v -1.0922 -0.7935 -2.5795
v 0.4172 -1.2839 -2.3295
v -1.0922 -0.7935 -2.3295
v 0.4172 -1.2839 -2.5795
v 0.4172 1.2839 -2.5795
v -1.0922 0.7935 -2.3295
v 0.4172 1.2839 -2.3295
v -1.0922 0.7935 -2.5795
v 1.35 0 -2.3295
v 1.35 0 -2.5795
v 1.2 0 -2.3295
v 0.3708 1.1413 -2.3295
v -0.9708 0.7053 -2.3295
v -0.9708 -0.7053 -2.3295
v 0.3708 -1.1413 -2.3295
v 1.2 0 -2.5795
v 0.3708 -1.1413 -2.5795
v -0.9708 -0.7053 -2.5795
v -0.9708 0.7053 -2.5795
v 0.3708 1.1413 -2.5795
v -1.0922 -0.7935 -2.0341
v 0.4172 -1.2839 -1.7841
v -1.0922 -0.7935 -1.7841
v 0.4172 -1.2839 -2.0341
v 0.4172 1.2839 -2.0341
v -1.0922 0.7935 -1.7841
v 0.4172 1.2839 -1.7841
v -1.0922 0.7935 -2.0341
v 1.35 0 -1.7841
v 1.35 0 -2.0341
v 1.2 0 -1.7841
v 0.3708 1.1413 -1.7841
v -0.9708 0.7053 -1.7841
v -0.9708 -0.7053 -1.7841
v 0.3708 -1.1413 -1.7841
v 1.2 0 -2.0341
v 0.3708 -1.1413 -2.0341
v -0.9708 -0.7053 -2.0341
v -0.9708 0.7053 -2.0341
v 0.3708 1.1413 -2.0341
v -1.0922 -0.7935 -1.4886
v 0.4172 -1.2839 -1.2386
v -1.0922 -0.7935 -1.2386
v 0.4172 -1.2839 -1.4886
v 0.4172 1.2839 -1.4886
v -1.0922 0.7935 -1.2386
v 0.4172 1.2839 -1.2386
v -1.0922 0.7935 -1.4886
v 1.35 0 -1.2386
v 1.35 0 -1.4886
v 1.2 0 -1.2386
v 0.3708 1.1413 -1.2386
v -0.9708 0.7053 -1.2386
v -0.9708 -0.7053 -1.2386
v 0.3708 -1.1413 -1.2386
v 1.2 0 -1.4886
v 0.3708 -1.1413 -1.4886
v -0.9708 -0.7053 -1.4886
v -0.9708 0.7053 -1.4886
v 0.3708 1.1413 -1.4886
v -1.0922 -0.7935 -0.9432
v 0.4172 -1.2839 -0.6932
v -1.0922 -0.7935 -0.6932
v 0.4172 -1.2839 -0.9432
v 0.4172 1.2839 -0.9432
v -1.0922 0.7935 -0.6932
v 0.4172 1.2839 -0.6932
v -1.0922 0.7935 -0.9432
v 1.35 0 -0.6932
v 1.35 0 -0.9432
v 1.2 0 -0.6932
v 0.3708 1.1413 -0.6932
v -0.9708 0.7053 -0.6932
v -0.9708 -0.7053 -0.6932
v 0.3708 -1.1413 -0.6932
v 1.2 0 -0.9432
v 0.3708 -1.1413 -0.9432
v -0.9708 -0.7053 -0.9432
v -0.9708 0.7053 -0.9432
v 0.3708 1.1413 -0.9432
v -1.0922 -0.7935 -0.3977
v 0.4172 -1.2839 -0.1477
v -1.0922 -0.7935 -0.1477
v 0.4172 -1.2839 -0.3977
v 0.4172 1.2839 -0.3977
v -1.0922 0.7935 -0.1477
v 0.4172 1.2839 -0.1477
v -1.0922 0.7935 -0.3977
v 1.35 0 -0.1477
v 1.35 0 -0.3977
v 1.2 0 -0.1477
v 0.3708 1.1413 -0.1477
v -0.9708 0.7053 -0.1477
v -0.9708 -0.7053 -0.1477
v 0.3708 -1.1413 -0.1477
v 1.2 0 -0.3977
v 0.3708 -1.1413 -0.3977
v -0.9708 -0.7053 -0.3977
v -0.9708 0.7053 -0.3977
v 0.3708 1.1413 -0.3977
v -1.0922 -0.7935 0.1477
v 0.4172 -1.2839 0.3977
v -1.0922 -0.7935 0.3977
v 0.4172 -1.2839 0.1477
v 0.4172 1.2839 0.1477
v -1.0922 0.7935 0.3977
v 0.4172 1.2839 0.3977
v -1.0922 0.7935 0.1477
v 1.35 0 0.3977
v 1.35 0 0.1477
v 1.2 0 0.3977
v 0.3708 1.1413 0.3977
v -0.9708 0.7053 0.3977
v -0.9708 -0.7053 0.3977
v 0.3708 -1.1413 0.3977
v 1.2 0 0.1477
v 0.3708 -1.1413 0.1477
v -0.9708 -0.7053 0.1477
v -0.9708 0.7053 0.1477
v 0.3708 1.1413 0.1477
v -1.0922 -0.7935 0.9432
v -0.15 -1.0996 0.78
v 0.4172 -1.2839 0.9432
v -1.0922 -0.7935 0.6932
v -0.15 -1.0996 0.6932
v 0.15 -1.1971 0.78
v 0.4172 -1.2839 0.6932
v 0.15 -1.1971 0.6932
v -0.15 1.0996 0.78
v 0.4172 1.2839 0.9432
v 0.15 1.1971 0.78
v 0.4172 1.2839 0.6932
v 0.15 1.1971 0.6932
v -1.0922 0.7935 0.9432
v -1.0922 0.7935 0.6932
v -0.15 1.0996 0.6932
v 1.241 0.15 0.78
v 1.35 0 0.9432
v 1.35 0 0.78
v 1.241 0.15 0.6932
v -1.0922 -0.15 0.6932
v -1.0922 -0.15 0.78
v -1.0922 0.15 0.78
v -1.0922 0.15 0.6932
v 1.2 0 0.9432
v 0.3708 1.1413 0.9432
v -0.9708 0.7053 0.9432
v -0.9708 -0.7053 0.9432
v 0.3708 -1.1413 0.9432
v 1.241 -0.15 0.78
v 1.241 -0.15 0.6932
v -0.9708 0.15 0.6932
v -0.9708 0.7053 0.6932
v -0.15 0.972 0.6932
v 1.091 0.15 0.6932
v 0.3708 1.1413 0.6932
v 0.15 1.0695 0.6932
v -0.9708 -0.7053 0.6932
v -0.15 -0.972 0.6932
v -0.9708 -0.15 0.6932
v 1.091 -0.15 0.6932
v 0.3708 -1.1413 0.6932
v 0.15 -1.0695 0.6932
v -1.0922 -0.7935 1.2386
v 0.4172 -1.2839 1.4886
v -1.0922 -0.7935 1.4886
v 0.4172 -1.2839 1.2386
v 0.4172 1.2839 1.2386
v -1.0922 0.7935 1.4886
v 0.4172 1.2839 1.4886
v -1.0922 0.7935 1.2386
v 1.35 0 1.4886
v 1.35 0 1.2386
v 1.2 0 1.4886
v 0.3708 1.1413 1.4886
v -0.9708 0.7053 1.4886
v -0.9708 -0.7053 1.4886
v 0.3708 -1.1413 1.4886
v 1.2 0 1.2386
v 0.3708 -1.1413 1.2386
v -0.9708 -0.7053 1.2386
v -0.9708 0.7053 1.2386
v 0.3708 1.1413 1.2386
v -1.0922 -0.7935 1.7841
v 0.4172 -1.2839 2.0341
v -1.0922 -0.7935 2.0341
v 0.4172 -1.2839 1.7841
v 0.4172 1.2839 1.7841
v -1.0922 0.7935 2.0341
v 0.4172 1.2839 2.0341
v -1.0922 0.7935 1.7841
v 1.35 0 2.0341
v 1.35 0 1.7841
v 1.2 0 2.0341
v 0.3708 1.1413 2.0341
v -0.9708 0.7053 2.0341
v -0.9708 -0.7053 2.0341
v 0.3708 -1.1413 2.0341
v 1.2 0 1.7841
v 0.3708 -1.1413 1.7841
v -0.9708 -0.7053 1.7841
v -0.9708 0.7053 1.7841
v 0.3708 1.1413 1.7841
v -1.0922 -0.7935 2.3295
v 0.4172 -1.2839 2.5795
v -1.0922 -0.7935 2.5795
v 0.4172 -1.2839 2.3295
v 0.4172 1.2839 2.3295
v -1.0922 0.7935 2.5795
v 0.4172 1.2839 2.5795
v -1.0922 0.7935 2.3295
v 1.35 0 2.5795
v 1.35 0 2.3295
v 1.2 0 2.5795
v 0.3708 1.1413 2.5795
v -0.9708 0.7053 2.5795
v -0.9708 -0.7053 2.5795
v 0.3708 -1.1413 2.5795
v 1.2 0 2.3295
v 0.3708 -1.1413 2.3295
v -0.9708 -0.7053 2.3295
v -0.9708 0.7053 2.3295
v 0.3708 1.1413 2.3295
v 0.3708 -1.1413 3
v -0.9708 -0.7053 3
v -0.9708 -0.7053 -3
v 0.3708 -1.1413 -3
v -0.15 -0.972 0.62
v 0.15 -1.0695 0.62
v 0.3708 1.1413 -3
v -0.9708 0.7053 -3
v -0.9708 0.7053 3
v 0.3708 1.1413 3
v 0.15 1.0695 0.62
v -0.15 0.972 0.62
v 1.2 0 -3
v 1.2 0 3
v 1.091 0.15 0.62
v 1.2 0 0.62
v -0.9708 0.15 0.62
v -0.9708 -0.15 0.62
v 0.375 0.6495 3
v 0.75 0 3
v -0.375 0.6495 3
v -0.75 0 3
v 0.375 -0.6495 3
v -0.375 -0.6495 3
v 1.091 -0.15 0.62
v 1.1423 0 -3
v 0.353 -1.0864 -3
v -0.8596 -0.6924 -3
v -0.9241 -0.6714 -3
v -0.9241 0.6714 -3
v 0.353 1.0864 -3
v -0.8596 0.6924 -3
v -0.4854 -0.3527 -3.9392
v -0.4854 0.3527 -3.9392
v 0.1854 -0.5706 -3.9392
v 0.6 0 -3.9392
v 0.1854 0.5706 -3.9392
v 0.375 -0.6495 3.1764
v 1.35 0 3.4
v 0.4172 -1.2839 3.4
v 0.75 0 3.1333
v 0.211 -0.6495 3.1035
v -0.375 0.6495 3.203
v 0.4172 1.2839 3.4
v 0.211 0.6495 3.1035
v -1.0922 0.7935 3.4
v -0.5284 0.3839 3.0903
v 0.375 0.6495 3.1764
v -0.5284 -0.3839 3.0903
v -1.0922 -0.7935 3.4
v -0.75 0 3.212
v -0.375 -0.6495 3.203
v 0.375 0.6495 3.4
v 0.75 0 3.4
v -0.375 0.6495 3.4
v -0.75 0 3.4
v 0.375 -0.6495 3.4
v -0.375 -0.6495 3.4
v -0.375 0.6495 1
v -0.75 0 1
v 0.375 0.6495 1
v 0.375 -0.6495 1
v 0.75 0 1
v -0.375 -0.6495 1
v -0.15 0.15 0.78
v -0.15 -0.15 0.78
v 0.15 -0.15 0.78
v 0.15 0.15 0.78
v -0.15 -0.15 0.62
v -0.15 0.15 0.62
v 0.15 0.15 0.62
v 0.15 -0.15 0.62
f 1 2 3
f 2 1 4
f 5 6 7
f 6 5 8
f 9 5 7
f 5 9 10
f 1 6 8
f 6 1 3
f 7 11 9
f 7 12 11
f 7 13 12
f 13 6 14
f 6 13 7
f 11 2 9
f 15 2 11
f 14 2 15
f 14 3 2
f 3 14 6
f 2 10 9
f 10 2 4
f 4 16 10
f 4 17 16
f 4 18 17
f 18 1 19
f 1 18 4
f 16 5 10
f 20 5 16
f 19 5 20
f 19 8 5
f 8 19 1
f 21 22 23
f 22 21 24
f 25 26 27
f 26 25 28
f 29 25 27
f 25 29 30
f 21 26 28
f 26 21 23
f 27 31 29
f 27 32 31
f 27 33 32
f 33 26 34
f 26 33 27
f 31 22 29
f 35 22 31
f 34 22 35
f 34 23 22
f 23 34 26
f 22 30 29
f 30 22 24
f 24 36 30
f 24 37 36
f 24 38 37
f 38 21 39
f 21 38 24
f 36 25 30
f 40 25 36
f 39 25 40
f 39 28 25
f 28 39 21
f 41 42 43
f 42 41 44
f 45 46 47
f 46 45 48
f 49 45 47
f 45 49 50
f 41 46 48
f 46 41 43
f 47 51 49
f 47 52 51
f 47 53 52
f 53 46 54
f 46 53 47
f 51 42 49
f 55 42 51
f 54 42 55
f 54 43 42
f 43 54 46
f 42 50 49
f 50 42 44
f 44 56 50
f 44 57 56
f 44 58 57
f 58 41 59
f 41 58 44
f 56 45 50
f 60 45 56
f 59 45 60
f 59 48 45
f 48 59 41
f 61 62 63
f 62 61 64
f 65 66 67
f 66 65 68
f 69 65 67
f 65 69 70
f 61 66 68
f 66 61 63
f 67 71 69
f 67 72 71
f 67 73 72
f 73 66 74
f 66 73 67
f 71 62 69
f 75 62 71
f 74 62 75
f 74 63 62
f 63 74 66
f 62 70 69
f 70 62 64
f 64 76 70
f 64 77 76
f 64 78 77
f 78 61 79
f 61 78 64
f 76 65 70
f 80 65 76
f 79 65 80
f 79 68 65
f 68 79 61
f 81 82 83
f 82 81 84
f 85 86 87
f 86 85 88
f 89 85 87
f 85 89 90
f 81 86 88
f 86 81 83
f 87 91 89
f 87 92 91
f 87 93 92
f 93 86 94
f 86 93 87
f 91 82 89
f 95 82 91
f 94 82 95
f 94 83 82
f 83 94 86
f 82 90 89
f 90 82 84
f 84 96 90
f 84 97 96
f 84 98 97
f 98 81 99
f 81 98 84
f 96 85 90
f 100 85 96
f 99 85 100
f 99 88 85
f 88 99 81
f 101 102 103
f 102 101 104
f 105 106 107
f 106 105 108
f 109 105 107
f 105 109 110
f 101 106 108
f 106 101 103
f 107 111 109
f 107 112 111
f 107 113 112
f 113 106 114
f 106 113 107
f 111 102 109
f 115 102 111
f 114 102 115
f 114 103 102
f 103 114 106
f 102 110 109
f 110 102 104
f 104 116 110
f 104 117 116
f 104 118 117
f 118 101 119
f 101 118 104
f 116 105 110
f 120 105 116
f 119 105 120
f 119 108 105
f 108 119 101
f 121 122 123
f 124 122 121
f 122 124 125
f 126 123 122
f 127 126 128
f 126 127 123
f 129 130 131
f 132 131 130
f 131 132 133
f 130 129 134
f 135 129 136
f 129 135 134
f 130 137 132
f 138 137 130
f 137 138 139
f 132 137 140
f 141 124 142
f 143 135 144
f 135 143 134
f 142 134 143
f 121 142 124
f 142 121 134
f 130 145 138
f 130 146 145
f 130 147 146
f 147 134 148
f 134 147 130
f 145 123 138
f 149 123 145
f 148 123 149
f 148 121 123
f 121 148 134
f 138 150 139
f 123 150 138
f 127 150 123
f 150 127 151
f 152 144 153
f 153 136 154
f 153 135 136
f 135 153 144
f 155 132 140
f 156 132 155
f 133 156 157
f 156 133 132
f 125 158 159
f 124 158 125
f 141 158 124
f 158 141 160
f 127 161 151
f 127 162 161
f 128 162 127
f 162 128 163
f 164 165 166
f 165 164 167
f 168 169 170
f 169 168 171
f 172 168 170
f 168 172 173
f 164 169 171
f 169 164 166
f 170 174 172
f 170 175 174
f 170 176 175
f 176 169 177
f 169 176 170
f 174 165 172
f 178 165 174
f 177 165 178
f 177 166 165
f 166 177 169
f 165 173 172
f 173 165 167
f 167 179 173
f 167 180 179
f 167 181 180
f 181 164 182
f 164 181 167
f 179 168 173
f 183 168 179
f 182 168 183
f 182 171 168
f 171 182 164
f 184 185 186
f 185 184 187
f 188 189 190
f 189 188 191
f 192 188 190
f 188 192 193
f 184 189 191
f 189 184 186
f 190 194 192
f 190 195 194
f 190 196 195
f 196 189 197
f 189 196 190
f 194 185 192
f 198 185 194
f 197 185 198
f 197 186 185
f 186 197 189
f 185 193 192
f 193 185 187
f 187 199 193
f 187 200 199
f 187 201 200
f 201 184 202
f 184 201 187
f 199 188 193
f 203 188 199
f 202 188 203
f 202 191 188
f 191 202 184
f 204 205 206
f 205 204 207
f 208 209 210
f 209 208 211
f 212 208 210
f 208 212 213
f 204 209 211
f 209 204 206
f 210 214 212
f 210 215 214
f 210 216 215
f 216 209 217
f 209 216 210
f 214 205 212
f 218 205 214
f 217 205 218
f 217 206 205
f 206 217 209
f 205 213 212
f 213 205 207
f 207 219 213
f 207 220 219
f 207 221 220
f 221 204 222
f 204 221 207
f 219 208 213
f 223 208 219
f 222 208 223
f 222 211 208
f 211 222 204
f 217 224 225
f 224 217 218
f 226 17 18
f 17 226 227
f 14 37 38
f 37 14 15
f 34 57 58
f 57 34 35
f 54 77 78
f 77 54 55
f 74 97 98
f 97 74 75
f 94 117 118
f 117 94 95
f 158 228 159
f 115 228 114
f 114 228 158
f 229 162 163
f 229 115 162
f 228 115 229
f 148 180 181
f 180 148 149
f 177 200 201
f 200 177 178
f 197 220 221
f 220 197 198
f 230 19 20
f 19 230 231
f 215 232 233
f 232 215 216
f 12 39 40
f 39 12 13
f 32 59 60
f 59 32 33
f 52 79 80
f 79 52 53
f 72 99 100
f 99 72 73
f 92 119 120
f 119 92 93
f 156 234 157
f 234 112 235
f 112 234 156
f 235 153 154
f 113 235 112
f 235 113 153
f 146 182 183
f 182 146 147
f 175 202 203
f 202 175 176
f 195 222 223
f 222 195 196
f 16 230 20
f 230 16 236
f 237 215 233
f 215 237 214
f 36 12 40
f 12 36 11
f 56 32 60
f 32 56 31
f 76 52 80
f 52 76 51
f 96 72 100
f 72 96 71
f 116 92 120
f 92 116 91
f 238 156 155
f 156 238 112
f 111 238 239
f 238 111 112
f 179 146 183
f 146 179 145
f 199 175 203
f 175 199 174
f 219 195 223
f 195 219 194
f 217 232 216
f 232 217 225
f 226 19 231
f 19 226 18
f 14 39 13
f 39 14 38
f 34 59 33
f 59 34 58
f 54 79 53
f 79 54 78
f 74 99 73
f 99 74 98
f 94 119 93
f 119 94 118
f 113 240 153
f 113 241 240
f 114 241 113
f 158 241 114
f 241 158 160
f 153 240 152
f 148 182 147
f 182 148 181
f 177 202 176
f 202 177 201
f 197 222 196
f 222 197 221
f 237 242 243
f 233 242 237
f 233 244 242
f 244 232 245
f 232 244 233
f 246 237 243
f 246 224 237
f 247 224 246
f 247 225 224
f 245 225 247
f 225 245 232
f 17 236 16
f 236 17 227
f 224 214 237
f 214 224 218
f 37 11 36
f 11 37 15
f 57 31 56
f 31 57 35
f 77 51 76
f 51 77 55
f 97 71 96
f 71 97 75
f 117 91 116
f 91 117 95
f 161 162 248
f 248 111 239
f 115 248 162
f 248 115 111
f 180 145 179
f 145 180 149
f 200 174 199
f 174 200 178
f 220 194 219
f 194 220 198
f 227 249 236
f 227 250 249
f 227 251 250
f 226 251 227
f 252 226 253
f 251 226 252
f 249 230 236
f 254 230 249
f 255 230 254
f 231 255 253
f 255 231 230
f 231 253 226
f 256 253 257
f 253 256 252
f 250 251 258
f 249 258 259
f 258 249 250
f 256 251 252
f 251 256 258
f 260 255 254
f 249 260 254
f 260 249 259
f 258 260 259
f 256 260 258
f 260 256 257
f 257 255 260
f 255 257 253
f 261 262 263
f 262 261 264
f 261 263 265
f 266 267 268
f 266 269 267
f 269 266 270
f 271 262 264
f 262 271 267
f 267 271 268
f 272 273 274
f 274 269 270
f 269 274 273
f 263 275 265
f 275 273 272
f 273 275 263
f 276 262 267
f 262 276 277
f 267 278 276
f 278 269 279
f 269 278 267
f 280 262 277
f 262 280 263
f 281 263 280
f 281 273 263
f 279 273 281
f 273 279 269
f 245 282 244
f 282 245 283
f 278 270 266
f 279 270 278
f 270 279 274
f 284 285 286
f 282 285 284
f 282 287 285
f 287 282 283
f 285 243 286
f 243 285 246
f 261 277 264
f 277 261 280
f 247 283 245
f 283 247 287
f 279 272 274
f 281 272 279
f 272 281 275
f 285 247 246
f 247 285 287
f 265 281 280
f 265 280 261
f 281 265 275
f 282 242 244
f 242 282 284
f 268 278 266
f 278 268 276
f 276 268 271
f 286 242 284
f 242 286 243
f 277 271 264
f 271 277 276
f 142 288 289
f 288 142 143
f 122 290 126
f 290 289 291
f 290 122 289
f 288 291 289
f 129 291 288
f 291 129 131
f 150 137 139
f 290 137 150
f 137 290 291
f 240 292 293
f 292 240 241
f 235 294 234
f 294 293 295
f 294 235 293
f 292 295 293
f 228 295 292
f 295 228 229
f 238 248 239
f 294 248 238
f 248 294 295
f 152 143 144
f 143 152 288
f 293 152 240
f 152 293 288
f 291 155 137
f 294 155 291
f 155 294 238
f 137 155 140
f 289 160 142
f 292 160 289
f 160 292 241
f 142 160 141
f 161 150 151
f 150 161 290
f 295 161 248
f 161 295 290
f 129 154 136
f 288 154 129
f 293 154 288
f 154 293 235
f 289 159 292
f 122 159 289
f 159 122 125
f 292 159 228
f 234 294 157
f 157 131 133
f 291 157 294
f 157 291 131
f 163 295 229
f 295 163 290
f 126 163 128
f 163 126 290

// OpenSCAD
// Parameters
thread_diameter = 3.0; //[1.5:6.0:0.1]
thread_pitch = 0.5; //[0.25:1.0:0.05]
screw_length = 6.0; //[3.0:12.0:0.5]
major_diameter = 3.0; //[1.5:6.0:0.1]
minor_diameter = 2.4; //[1.2:4.8:0.05]
thread_length = 6.0; //[3.0:12.0:0.5]
tip_chamfer = 0.3; //[0.1:0.8:0.05]
socket_af = 1.5; //[0.8:3.0:0.1]
socket_depth = 2.0; //[1.0:4.0:0.1]
overlap = 0.8; //[0.3:2.0:0.1]
thread_runout_length = 0.6; //[0.3:1.5:0.1]
drive_end_chamfer = 0.25; //[0.1:0.8:0.05]
thread_ridge_height = 0.15; //[0.05:0.35:0.01]
thread_ridge_width = 0.25; //[0.1:0.6:0.05]
thread_ridge_count = 10; //[4:24:1]
marking_depth = 0.08; //[0.03:0.2:0.01]
marking_width = 0.3; //[0.15:0.8:0.05]

// Base shapes
module threaded_cylindrical_body() {
  translate([0, 0, 0])
    cylinder(h=thread_length, r=minor_diameter/2, center=true);
}

module thread_ridge(position_index) {
  translate([0, 0, -thread_length/2 + position_index * (thread_length/(thread_ridge_count+1))])
    cylinder(h=thread_ridge_width, r=minor_diameter/2 + thread_ridge_height, center=true);
}

module thread_runout() {
  translate([0, 0, thread_length/2 - thread_runout_length/2 + overlap/2])
    rotate([180, 0, 0])
    cylinder(h=thread_runout_length, r1=minor_diameter/2 + thread_ridge_height, r2=0, center=true);
}

module tip_end() {
  translate([0, 0, -thread_length/2 - tip_chamfer/2 + overlap/2])
    cylinder(h=tip_chamfer, r1=minor_diameter/2, r2=0, center=true);
}

module tip_style_detail() {
  translate([0, 0, -thread_length/2 - tip_chamfer + (minor_diameter/2) - overlap])
    sphere(r=minor_diameter/2, center=true);
}

module drive_end_chamfer_solid() {
  translate([0, 0, thread_length/2 + drive_end_chamfer/2 - overlap/2])
    rotate([180, 0, 0])
    cylinder(h=drive_end_chamfer, r1=minor_diameter/2, r2=0, center=true);
}

module drive_socket() {
  translate([0, 0, thread_length/2 - socket_depth/2 + overlap/2])
    linear_extrude(height=socket_depth + overlap, center=true)
    polygon(points=[
      [socket_af/2, 0],
      [socket_af/4, socket_af*0.4330127019],
      [-socket_af/4, socket_af*0.4330127019],
      [-socket_af/2, 0],
      [-socket_af/4, -socket_af*0.4330127019],
      [socket_af/4, -socket_af*0.4330127019]
    ]);
}

module surface_marking_groove(rotation_angle) {
  translate([0, 0, thread_length/2 - socket_depth - thread_runout_length/2])
    rotate([0, 0, rotation_angle])
    cube([minor_diameter + 2*thread_ridge_height + overlap, marking_width, marking_depth*2], center=true);
}

// Operations
module threaded_body_with_ridges() {
  union() {
    threaded_cylindrical_body();
    for (i = [1:thread_ridge_count])
      thread_ridge(i);
  }
}

module body_with_tip_and_runout() {
  union() {
    threaded_body_with_ridges();
    tip_end();
    tip_style_detail();
    thread_runout();
    drive_end_chamfer_solid();
  }
}

module body_minus_drive_socket() {
  difference() {
    body_with_tip_and_runout();
    drive_socket();
  }
}

module surface_markings() {
  difference() {
    body_minus_drive_socket();
    surface_marking_groove(0);
    surface_marking_groove(90);
  }
}

// Final output
surface_markings();
